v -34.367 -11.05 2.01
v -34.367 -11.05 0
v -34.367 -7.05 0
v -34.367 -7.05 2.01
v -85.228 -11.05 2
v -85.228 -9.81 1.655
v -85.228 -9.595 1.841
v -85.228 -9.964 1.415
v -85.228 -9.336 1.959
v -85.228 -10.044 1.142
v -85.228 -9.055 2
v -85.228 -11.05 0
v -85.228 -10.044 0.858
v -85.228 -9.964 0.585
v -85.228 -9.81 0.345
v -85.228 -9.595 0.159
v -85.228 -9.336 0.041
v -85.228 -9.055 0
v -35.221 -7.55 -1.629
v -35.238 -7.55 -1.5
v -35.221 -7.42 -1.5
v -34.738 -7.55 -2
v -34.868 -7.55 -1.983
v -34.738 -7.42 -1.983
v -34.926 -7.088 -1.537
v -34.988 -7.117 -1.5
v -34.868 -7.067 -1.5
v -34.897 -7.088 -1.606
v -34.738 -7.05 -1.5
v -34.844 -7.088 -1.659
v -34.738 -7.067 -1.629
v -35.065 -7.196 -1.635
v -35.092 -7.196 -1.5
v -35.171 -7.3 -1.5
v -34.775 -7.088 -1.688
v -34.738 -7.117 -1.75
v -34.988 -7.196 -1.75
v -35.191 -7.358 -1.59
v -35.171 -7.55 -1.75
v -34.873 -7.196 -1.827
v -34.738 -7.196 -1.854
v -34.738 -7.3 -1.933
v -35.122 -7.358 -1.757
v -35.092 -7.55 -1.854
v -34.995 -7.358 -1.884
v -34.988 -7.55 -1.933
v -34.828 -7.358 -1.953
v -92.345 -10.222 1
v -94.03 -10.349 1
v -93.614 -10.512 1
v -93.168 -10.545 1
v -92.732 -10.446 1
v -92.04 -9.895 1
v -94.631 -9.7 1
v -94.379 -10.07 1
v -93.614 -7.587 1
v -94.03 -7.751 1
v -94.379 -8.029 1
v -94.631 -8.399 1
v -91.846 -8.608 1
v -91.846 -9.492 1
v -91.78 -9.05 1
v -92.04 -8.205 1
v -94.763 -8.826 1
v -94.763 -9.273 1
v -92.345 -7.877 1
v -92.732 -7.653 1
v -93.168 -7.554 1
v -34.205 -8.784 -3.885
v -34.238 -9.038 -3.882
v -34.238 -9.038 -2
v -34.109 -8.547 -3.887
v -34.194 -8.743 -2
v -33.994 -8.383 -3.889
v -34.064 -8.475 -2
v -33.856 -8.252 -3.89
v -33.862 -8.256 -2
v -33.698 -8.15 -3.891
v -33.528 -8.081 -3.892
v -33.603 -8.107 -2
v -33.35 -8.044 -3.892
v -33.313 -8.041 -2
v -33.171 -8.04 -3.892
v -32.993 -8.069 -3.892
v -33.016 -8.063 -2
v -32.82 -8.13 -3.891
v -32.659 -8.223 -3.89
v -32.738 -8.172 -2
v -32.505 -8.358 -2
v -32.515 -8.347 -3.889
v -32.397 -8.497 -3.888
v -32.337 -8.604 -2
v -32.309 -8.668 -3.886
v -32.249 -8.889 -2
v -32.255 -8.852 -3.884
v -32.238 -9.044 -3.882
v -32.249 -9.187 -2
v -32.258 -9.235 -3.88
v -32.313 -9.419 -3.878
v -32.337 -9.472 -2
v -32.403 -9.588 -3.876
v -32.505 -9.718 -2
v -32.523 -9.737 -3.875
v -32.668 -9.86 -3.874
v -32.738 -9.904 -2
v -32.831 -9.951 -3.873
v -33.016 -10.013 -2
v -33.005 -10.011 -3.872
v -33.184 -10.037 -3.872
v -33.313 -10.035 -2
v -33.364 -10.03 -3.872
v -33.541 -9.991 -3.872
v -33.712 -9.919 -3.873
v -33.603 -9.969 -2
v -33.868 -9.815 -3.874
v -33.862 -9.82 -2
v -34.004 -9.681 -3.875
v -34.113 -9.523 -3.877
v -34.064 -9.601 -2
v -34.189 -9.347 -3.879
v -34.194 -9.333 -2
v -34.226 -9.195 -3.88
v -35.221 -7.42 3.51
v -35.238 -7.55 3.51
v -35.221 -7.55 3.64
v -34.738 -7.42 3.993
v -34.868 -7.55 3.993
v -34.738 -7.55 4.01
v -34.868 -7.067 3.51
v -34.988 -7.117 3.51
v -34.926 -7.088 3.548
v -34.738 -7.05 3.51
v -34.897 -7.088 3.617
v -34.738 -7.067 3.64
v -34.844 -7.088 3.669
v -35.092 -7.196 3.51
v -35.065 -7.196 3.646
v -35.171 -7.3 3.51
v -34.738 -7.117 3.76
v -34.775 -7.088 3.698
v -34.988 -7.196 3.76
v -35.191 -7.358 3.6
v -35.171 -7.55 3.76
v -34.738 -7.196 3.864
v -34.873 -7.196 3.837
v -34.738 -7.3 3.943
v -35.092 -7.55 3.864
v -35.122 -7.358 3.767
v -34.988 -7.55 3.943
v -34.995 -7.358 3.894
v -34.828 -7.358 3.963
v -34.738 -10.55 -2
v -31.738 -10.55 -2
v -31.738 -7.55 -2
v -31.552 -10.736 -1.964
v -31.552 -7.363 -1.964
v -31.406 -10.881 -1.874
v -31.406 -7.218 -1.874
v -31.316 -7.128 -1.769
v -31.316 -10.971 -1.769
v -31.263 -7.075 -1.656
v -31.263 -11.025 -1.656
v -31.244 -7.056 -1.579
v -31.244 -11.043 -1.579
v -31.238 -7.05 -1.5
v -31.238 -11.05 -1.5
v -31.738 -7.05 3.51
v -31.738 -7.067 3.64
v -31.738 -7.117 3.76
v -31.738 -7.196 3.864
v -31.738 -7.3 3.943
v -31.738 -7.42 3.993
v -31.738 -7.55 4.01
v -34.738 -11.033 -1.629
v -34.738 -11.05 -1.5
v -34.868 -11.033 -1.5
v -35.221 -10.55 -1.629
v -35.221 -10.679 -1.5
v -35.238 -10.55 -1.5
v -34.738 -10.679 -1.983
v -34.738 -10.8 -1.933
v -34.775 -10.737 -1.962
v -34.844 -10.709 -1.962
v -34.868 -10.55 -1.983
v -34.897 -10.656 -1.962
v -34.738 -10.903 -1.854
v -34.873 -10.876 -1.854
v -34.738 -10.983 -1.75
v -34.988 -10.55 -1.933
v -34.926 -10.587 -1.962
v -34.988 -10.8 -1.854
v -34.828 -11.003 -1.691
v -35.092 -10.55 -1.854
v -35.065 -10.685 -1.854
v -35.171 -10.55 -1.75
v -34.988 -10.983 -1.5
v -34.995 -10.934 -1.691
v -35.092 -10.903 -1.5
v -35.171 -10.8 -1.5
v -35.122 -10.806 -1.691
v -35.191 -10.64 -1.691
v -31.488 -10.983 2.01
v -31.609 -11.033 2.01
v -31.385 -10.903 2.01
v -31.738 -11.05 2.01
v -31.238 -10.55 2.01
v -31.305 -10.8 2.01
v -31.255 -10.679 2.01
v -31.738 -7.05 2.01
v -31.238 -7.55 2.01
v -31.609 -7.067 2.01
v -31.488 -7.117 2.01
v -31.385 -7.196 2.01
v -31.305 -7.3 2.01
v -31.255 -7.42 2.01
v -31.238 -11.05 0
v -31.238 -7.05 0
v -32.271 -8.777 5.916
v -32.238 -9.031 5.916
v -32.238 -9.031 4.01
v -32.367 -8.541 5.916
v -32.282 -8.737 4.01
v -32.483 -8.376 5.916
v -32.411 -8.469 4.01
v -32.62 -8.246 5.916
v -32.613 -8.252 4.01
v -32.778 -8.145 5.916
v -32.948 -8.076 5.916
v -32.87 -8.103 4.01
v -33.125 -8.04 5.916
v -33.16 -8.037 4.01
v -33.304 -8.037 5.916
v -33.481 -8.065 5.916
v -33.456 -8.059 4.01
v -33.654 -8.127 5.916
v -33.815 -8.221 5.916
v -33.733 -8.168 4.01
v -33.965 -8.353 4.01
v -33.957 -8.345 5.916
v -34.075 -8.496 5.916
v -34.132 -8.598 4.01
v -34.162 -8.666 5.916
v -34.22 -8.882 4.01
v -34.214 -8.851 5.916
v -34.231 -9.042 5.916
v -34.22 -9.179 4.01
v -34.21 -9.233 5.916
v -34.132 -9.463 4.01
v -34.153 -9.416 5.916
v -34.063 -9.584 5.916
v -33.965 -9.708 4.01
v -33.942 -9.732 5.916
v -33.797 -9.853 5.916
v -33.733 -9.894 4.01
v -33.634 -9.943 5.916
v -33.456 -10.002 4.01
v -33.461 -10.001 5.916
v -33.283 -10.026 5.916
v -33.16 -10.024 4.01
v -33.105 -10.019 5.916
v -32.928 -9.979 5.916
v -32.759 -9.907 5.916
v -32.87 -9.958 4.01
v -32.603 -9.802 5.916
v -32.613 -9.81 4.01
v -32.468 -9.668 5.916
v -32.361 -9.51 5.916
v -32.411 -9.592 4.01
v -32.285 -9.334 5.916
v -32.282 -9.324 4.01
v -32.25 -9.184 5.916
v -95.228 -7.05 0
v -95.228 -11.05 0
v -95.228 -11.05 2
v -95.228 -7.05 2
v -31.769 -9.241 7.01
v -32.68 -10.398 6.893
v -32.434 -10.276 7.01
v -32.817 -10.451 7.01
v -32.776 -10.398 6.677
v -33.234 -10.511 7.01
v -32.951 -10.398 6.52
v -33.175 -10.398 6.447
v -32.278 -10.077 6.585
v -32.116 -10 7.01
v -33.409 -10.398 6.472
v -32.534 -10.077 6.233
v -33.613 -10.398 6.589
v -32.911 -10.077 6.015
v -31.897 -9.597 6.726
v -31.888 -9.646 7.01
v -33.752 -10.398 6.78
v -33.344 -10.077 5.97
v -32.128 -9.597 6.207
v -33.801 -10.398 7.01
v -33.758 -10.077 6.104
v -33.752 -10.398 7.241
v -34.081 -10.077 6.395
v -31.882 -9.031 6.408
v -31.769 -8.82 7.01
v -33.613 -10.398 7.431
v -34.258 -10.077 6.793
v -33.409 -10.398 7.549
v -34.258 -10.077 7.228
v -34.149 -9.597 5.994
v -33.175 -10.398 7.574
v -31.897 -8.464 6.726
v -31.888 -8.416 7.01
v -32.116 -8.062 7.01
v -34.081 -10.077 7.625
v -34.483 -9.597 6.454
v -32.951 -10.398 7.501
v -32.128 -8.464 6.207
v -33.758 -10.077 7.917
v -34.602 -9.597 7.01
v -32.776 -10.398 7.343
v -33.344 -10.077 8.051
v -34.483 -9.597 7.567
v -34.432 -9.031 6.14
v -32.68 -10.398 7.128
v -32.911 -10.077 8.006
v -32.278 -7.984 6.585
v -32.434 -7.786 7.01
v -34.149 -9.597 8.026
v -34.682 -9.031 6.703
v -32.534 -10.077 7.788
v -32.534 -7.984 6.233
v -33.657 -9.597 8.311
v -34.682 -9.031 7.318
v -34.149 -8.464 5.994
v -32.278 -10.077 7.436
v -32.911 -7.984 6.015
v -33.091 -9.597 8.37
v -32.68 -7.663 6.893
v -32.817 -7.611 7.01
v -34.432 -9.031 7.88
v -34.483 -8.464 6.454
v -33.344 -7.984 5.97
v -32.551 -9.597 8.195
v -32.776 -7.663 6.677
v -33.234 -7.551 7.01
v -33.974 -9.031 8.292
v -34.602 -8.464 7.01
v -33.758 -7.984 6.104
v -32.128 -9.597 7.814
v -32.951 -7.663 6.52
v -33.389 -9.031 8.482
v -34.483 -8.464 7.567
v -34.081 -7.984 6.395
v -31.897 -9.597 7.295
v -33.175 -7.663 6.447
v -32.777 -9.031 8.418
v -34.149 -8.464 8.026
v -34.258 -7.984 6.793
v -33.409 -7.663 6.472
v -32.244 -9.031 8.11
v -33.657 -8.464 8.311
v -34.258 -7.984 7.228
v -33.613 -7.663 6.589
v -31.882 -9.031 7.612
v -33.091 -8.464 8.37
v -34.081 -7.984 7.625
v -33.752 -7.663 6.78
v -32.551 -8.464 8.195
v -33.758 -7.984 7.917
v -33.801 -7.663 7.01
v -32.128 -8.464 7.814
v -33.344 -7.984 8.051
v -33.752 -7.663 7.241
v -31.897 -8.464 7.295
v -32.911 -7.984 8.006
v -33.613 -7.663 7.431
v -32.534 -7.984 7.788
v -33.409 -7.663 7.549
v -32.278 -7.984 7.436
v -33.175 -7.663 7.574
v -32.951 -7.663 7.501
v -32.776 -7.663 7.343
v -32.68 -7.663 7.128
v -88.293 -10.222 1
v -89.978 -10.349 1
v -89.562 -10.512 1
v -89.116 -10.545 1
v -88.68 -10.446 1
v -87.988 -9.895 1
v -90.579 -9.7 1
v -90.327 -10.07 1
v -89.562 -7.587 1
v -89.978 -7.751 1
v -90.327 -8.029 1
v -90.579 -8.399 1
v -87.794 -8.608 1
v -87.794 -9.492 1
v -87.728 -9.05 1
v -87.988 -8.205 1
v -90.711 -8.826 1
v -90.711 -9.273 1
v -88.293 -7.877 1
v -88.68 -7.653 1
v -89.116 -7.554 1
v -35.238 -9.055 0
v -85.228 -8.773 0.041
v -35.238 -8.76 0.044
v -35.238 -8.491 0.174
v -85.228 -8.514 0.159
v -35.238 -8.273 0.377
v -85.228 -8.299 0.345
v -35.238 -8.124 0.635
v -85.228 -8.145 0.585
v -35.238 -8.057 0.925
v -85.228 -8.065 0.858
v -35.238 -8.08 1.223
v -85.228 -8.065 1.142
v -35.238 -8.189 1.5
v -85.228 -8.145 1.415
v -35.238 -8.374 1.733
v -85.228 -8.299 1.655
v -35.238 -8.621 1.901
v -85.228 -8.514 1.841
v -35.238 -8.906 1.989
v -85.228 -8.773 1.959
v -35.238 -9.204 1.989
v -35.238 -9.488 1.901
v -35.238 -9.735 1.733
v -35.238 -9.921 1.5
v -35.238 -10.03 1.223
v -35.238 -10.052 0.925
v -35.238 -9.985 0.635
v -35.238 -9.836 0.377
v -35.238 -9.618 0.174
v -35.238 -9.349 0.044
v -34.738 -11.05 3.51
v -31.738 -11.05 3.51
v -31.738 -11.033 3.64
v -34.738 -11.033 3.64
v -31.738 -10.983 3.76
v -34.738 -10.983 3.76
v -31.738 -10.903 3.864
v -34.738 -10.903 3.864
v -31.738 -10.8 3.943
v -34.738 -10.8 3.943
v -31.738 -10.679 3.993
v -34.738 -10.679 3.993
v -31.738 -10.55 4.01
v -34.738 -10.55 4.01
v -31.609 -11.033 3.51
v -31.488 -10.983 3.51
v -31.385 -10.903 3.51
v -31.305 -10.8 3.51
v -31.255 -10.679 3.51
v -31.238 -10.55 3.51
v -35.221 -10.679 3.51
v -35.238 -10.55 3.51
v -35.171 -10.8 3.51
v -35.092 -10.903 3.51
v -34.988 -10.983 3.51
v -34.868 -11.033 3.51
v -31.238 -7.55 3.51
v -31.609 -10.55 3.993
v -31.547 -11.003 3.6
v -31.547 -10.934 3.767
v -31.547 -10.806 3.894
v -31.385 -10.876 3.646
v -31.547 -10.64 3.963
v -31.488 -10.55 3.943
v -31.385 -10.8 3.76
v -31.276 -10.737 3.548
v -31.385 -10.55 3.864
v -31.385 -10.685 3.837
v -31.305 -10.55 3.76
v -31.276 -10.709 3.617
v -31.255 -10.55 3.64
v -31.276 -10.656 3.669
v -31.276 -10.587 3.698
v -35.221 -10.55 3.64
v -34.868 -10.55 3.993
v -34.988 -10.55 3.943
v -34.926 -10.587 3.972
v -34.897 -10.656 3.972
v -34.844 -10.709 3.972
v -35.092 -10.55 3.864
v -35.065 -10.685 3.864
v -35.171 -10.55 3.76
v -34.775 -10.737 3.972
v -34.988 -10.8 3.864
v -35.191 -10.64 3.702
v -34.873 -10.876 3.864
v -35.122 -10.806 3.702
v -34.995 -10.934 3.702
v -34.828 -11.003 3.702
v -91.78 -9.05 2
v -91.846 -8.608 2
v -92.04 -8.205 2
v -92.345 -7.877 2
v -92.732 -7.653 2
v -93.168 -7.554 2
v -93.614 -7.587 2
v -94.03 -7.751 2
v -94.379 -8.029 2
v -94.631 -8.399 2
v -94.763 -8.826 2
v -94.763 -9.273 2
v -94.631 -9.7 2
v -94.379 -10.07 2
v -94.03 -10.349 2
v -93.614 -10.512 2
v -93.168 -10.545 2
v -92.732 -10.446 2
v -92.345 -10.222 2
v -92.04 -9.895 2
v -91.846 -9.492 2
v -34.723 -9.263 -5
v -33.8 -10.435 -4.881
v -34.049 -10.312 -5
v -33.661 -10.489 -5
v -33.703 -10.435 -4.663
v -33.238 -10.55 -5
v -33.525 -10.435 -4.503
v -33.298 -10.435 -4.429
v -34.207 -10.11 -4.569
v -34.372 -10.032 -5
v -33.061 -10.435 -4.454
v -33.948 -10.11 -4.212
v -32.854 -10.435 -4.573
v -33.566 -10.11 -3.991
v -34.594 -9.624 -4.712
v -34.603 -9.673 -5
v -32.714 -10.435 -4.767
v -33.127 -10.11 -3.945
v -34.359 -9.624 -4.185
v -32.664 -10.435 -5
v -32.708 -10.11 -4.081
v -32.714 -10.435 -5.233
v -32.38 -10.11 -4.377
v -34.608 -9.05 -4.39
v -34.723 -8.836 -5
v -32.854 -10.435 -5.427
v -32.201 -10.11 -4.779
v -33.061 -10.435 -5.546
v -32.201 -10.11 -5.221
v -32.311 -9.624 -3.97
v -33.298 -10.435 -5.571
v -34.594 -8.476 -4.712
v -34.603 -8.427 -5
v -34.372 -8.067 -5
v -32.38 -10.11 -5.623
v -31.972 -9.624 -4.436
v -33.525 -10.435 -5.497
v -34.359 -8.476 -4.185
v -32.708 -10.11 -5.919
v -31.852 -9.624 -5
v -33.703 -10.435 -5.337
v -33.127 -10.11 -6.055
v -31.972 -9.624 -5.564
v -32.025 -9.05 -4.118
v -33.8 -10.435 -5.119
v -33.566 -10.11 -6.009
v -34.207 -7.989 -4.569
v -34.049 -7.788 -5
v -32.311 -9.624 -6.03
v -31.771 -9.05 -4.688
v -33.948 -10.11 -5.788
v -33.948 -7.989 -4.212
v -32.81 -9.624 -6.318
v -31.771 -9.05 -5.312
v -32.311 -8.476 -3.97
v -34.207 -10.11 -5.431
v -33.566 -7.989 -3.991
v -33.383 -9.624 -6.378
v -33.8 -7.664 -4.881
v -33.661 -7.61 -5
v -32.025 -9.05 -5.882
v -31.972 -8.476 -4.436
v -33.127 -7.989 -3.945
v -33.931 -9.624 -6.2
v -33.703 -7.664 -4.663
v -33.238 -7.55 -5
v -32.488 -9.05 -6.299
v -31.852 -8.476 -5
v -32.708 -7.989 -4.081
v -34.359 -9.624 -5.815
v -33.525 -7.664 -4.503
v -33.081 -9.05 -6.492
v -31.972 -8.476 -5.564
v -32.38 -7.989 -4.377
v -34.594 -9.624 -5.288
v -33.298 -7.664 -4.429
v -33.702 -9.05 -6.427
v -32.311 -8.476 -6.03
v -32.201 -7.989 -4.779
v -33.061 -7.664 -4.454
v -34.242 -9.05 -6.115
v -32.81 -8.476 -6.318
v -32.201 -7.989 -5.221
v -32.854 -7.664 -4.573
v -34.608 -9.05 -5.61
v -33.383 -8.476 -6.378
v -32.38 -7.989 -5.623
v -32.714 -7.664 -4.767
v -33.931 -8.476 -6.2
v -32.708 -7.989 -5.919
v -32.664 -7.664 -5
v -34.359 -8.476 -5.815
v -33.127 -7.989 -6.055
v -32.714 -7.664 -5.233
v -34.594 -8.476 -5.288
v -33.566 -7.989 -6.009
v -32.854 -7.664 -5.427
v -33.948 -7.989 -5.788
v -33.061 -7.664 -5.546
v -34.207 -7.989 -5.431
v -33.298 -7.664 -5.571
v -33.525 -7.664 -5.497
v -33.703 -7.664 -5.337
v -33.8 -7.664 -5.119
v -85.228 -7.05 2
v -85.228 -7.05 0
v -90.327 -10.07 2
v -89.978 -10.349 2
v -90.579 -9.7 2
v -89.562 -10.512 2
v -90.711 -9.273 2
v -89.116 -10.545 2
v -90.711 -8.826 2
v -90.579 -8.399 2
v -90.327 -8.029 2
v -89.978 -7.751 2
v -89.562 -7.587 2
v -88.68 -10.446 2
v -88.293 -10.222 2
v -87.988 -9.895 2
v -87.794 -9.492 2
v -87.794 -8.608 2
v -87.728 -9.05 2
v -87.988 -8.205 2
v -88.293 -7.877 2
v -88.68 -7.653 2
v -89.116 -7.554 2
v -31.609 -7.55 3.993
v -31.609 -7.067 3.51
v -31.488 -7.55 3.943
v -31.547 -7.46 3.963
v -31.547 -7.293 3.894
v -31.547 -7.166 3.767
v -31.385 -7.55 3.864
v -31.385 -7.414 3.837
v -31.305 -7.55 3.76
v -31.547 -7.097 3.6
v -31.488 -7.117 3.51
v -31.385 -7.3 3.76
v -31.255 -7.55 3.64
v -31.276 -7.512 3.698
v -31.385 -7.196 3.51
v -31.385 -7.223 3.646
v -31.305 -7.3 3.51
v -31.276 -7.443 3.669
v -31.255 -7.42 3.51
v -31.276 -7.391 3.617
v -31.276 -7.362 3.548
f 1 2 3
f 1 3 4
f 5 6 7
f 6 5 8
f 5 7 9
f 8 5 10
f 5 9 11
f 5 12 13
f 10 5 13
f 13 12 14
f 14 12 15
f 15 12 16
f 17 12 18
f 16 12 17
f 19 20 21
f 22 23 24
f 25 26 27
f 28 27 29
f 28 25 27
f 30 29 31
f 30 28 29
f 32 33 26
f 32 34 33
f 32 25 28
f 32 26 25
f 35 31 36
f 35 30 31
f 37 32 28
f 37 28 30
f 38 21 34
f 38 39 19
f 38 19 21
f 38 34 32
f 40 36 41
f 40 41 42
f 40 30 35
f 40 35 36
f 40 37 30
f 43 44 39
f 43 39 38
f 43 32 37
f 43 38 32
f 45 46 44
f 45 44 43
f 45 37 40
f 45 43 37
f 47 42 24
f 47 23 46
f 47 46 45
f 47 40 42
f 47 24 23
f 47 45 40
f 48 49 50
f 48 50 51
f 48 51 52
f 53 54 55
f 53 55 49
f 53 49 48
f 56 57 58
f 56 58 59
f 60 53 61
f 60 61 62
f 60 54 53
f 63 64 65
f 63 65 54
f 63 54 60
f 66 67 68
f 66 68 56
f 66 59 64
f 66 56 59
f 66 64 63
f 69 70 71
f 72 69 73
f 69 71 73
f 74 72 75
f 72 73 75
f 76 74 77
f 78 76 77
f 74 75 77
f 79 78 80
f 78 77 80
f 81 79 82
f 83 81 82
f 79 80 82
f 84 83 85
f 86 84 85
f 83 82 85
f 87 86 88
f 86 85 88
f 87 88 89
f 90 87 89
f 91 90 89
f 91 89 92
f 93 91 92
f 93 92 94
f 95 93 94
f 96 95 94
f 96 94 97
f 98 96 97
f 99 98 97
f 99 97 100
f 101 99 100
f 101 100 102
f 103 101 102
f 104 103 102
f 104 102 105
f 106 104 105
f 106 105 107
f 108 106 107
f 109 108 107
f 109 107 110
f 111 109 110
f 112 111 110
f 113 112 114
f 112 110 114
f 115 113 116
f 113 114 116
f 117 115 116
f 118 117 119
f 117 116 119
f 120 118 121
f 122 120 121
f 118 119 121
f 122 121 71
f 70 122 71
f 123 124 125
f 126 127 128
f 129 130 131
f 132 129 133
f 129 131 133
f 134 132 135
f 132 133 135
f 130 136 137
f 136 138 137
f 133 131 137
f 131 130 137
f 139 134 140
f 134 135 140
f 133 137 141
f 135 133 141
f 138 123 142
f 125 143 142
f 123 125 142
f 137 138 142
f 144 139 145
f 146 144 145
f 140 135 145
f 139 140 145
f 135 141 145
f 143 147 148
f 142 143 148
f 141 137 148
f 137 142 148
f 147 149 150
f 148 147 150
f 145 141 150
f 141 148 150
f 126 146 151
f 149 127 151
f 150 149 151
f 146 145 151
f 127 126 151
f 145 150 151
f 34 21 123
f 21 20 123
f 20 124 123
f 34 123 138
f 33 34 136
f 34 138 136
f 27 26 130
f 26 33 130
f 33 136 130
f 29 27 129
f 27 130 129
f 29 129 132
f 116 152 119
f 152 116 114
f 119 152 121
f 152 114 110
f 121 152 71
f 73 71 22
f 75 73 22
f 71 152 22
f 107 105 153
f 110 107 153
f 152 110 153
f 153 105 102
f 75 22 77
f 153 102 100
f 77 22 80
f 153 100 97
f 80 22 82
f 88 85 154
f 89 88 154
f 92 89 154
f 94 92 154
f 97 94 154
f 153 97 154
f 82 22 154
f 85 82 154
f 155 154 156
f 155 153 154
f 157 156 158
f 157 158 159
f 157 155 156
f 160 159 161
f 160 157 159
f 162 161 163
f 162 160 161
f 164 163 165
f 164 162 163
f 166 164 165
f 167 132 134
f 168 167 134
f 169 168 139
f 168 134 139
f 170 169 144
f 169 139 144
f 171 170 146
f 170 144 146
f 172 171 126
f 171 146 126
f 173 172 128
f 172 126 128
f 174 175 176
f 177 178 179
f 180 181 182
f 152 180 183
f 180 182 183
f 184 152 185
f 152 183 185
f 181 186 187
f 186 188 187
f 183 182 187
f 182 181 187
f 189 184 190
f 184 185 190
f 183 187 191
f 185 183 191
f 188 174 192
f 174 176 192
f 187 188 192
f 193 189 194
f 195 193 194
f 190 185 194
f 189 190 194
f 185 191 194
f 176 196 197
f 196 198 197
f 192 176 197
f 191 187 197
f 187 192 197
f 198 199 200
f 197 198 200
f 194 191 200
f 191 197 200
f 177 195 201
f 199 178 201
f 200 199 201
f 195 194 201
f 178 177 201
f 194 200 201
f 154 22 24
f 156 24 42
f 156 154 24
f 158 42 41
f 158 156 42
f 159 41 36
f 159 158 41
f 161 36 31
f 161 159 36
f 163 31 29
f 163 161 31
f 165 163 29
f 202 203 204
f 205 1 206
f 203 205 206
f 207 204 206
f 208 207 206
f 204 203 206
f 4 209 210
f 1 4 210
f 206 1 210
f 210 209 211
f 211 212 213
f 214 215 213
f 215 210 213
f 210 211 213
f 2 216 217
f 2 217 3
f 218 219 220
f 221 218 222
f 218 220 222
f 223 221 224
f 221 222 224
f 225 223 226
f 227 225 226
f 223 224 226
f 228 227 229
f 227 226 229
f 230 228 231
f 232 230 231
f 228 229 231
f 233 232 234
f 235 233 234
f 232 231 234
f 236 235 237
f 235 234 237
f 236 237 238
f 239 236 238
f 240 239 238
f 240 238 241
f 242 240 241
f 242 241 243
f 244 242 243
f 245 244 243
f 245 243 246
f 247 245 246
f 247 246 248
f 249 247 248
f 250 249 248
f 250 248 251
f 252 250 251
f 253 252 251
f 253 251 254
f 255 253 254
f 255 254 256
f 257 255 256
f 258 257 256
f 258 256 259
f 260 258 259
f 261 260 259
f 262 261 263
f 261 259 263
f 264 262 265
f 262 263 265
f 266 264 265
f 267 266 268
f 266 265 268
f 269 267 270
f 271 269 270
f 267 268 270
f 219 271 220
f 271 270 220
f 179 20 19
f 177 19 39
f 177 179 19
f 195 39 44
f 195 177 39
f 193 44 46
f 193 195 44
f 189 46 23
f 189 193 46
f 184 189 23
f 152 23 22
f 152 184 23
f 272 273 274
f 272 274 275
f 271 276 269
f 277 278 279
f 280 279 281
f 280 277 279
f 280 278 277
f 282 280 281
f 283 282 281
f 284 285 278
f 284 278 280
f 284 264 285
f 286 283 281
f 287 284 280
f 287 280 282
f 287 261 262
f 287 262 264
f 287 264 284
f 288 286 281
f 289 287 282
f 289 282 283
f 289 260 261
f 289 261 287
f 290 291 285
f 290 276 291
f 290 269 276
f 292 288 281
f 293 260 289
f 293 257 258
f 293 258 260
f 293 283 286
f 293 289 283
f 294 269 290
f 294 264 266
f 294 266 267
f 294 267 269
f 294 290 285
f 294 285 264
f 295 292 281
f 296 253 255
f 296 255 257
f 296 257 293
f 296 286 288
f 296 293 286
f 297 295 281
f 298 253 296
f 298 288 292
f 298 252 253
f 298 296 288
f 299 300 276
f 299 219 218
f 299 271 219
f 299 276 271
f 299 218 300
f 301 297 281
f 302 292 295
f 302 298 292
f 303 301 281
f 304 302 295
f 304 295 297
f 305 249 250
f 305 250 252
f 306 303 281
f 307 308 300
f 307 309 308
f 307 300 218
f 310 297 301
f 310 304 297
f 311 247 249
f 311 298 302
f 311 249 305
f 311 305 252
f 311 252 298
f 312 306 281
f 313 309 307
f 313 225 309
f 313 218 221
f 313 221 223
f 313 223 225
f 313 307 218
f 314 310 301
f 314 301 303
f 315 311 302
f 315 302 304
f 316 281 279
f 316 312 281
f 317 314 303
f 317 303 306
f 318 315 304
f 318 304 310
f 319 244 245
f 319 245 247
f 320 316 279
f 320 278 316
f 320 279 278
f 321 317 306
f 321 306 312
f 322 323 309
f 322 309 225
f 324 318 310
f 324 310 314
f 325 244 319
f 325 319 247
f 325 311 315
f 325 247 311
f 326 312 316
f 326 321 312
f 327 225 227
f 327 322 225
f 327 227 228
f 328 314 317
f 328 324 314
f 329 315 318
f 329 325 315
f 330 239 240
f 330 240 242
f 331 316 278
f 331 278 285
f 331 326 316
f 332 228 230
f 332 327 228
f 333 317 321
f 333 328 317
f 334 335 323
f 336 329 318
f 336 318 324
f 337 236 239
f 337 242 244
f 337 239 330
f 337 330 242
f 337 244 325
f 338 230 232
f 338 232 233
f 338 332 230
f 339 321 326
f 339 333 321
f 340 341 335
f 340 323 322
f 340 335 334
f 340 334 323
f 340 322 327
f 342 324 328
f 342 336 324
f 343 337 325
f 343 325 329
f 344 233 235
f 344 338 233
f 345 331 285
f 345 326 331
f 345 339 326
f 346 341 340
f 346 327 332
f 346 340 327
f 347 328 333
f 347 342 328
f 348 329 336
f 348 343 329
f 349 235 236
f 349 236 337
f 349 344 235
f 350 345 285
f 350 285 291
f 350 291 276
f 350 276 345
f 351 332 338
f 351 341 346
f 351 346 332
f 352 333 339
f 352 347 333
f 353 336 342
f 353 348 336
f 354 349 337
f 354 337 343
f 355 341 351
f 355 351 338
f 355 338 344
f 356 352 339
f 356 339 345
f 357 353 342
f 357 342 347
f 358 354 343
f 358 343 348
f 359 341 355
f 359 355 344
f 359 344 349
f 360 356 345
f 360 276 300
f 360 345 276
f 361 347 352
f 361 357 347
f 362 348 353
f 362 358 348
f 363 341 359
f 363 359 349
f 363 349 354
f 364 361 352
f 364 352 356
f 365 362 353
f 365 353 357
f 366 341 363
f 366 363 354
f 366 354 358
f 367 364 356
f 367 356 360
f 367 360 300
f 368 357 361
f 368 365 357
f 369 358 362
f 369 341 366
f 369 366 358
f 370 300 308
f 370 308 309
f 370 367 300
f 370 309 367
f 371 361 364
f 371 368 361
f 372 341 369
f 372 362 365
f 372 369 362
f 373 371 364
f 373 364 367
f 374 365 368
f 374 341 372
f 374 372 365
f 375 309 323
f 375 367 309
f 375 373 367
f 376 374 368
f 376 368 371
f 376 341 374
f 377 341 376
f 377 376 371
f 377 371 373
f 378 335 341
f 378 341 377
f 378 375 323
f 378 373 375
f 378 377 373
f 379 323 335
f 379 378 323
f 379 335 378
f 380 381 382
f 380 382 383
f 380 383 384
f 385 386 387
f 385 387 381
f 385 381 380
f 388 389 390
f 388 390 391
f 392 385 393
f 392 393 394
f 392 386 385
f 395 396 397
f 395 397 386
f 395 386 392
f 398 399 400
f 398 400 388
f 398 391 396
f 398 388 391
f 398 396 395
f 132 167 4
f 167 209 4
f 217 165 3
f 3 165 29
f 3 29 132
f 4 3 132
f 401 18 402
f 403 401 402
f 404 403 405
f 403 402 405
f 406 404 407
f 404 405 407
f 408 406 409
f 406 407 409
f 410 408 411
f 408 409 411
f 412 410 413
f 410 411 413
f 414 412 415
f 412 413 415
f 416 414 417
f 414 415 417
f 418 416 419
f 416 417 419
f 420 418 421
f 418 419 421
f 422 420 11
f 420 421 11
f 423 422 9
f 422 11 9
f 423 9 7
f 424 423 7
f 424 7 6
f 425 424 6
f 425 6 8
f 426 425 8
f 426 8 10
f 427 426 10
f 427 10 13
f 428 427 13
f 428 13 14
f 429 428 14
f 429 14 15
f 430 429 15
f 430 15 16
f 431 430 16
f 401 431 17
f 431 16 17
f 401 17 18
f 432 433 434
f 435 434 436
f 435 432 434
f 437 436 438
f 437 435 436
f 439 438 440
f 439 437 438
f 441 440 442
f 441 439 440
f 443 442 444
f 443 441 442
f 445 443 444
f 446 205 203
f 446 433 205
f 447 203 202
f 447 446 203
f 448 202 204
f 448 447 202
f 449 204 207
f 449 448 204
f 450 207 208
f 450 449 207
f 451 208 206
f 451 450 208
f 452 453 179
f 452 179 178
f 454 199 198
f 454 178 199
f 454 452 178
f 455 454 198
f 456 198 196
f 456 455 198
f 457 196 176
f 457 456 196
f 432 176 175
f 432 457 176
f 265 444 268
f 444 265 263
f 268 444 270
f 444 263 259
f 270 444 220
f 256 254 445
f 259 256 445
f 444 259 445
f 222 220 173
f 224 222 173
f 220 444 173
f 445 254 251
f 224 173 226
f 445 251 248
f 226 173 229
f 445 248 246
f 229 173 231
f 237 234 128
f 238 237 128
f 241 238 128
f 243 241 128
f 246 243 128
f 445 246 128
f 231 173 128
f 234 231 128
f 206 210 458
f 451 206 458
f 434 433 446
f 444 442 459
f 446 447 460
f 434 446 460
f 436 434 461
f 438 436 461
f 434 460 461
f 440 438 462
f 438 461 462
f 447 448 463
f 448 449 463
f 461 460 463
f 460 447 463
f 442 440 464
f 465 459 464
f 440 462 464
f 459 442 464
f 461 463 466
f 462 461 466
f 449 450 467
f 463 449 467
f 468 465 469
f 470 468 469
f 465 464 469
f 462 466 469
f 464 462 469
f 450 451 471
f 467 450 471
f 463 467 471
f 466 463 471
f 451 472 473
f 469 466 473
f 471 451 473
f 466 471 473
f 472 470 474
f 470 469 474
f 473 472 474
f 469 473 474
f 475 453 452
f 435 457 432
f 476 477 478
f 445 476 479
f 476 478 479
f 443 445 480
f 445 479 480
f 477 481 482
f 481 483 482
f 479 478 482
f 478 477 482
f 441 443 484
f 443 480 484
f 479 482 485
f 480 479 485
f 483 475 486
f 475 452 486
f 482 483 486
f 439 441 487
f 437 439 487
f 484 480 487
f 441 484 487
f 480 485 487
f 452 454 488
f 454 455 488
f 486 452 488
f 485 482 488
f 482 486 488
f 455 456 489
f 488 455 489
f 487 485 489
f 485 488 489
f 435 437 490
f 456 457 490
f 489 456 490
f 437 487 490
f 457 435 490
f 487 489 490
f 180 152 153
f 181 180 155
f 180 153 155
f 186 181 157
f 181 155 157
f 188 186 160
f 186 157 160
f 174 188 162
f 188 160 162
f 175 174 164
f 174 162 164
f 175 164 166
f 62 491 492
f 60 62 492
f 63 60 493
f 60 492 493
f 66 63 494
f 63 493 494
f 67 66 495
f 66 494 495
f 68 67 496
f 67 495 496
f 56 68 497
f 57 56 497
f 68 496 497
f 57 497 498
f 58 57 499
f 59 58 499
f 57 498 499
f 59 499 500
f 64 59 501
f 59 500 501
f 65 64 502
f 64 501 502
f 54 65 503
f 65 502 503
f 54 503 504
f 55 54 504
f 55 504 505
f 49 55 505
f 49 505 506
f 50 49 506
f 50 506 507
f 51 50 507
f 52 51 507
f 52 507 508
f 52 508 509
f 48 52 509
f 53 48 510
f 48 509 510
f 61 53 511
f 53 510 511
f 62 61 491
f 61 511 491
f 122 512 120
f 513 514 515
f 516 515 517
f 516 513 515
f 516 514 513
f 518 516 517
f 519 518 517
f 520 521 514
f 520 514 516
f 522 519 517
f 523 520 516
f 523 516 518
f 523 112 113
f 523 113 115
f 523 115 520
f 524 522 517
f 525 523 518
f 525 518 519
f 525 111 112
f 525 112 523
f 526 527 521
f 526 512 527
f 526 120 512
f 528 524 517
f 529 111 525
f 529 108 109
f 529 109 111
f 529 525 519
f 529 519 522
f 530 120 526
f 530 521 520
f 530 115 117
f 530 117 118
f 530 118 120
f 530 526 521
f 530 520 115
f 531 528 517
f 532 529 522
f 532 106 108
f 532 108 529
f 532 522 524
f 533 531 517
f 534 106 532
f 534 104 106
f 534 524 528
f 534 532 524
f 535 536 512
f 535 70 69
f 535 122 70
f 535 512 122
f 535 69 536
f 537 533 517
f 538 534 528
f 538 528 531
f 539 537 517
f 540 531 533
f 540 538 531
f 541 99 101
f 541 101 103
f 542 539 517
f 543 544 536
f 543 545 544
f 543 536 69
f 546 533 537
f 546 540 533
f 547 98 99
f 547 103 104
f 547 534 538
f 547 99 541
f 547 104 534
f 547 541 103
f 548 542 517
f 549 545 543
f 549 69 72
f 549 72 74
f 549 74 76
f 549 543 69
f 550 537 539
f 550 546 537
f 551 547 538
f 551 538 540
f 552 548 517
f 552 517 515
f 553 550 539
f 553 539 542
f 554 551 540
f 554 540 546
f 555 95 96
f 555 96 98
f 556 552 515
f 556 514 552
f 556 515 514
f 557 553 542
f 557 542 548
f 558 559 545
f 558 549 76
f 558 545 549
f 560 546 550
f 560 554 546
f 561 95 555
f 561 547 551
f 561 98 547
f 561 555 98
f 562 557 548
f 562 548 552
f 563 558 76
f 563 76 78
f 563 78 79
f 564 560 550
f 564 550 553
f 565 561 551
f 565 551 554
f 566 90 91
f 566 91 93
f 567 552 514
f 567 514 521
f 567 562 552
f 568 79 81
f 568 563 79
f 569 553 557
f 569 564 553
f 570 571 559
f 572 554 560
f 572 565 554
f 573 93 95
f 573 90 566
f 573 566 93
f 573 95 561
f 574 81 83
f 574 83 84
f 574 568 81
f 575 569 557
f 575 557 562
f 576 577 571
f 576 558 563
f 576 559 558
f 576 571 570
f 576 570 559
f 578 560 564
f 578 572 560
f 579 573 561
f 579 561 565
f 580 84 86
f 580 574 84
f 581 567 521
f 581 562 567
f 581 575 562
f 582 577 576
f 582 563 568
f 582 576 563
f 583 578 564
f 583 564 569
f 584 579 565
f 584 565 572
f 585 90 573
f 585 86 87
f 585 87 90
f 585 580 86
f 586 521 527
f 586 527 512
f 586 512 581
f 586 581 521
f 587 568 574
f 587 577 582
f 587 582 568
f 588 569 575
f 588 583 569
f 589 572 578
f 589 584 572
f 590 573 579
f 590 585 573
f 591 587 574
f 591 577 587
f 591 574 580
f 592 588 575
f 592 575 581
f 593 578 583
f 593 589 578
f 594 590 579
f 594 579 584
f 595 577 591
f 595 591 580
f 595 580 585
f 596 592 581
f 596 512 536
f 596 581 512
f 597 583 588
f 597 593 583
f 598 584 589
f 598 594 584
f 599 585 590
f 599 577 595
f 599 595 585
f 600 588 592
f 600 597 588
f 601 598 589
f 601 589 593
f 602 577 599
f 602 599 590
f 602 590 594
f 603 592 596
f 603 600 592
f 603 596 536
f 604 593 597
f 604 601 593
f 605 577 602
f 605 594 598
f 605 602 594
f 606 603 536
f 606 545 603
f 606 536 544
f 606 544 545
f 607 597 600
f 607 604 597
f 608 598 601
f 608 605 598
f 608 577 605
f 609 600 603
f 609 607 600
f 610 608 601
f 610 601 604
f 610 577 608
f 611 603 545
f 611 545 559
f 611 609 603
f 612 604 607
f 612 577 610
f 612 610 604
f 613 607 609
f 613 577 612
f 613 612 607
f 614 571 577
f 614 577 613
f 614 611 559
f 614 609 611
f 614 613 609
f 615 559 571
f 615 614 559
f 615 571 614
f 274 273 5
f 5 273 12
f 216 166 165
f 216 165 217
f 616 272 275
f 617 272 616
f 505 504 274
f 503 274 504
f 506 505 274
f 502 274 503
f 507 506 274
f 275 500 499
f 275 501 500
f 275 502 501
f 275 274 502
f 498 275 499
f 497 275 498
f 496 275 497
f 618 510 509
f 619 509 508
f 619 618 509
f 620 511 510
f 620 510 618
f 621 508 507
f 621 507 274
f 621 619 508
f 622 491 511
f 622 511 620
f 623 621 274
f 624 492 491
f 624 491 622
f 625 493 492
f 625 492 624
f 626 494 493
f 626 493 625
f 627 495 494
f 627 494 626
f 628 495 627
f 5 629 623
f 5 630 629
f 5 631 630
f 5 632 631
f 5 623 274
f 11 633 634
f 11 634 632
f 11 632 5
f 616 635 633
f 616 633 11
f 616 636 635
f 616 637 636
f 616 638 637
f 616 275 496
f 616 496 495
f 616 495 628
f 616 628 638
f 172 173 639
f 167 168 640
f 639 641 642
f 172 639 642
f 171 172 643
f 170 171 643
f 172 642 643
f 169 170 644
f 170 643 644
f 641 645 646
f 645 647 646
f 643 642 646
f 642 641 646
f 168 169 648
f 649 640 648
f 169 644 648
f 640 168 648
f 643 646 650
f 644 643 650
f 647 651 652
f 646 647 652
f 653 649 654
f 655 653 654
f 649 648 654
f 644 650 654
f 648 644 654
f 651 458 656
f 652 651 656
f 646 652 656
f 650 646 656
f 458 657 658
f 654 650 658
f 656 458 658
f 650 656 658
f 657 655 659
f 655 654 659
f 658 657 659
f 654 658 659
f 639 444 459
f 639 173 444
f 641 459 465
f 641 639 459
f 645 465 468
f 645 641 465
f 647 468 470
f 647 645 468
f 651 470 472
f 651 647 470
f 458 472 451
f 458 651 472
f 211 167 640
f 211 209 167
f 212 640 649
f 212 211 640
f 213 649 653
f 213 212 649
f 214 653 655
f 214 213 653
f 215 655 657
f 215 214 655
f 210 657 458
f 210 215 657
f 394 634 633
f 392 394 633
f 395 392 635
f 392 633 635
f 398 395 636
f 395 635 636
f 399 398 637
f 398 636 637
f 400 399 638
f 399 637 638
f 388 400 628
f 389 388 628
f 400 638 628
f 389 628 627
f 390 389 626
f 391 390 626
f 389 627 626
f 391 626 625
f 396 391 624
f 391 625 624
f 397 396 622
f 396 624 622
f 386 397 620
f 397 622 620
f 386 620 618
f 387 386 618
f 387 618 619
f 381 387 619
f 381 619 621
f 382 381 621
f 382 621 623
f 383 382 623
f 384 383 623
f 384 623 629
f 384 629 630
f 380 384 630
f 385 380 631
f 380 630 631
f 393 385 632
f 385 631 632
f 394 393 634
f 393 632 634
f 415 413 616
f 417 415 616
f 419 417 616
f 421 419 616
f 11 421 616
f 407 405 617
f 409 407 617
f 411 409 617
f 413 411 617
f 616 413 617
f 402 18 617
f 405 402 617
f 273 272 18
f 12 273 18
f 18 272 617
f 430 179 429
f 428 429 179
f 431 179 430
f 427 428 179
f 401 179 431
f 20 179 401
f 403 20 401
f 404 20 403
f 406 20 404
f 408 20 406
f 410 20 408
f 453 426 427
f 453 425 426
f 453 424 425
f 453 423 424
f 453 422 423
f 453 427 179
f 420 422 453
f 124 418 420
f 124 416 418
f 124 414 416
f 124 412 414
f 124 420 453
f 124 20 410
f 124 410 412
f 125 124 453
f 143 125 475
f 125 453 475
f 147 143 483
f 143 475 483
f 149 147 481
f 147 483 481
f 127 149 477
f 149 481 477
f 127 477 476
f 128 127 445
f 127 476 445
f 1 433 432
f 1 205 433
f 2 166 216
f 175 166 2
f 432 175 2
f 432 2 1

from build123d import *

# Parameters (mm, degrees)
SKETCH1_W           = 10
SKETCH1_H           = 4
BOSS_EXTRUDE1_DEPTH = 2
SKETCH2_R           = 1.5
CUT_EXTRUDE1_DEPTH  = 1
SKETCH3_R           = 1
BOSS_EXTRUDE2_DEPTH = 50
BOSS_EXTRUDE3_DEPTH = 4
FILLET1_R           = 0.5
SKETCH6_R           = 1
BOSS_EXTRUDE6_DEPTH = 3
FILLET2_R           = 0.5
SKETCH18_R          = 0.996476916
BOSS_EXTRUDE7_DEPTH = 3


with BuildPart() as part:
    # Sketch1 → Boss-Extrude1 (new body)
    with BuildSketch(Plane.XY):
        with Locations((-90.227807008, -9.049640054)):
            Rectangle(SKETCH1_W, SKETCH1_H)
    extrude(amount=BOSS_EXTRUDE1_DEPTH)

    # Sketch2 → Cut-Extrude1 (cut)
    with BuildSketch(Plane.XY.offset(2)):
        with Locations((-93.279774428, -9.049640054)):
            Circle(SKETCH2_R)
        with Locations((-89.227807008, -9.049640054)):
            Circle(SKETCH2_R)
    extrude(amount=-CUT_EXTRUDE1_DEPTH, mode=Mode.SUBTRACT)

    # Sketch3 → Boss-Extrude2 (add)
    with BuildSketch(Plane(origin=(-85.227807008, 0, 0), x_dir=(0, 0, -1), z_dir=(1, 0, 0))):
        with Locations((-1, -9.054602908)):
            Circle(SKETCH3_R)
    extrude(amount=BOSS_EXTRUDE2_DEPTH)

    # Sketch4 → Boss-Extrude3 (add)
    with BuildSketch(Plane(origin=(0, -7.049640054, 0), x_dir=(1, 0, 0), z_dir=(0, 1, 0))):
        Polygon((-35.238104557, 0), (-35.238104557, 2), (-31.238104557, 2), (-31.238104557, 0), (-34.367083254, 0), (-34.367083254, -2.010361564), (-31.238104557, -2.010361564), (-31.238104557, -4.010361564), (-35.238104557, -4.010361564), align=None)
    extrude(amount=-BOSS_EXTRUDE3_DEPTH)

    # Fillet1
    fillet1_edges = [part.edges().sort_by_distance(p)[0] for p in [
        (-35.238104557, -11.049640054, 1.005180782),
        (-35.238104557, -9.049640054, 4.010361564),
        (-33.238104557, -11.049640054, -2),
        (-35.238104557, -9.049640054, -2),
        (-31.238104557, -9.049640054, -2),
        (-33.238104557, -11.049640054, 4.010361564),
        (-35.238104557, -7.049640054, 1.005180782),
        (-33.238104557, -7.049640054, 4.010361564),
        (-33.238104557, -7.049640054, -2),
    ]]
    fillet(fillet1_edges, radius=FILLET1_R)

    # Sketch6 → Boss-Extrude6 (add)
    with BuildSketch(Plane(origin=(0, 0, -2), x_dir=(-1, 0, 0), z_dir=(0, 0, -1))):
        with Locations((33.238104557, -9.038134052)):
            Circle(SKETCH6_R)
    extrude(amount=BOSS_EXTRUDE6_DEPTH)

    # Sketch16 → Revolve10 (revolve)
    with BuildSketch(Plane(origin=(0, 0, -5), x_dir=(-1, 0, 0), z_dir=(0, 0, -1))):
        with BuildLine():
            Line((33.238104557, -7.549640054), (33.238104557, -10.549640054))
            ThreePointArc((33.238104557, -10.549640054), (34.738104557, -9.049640054), (33.238104557, -7.549640054))
        make_face()
    revolve(axis=Axis((-33.238104557, -1009.038134052, -5), (0, 1, 0)))

    # Fillet2
    fillet2_edges = [part.edges().sort_by_distance(p)[0] for p in [
        (-31.238104557, -11.049640054, 2.760361564),
        (-31.238104557, -7.049640054, 2.760361564),
        (-31.238104557, -9.049640054, 4.010361564),
        (-31.238104557, -7.196086663, 3.863914954),
        (-31.238104557, -10.903193444, 3.863914954),
    ]]
    fillet(fillet2_edges, radius=FILLET2_R)

    # Sketch18 → Boss-Extrude7 (add)
    with BuildSketch(Plane.XY.offset(4.010361564)):
        with Locations((-33.23429851, -9.03071029)):
            Circle(SKETCH18_R)
    extrude(amount=BOSS_EXTRUDE7_DEPTH)

    # Sketch20 → Revolve22 (revolve)
    with BuildSketch(Plane.XY.offset(7.010361564)):
        with BuildLine():
            Line((-33.23429851, -7.550711674), (-33.23429851, -10.510708905))
            ThreePointArc((-33.23429851, -10.510708905), (-31.754299895, -9.03071029), (-33.23429851, -7.550711674))
        make_face()
    revolve(axis=Axis((-33.23429851, -1009.03071029, 7.010361564), (0, 1, 0)))


solid = part.part
